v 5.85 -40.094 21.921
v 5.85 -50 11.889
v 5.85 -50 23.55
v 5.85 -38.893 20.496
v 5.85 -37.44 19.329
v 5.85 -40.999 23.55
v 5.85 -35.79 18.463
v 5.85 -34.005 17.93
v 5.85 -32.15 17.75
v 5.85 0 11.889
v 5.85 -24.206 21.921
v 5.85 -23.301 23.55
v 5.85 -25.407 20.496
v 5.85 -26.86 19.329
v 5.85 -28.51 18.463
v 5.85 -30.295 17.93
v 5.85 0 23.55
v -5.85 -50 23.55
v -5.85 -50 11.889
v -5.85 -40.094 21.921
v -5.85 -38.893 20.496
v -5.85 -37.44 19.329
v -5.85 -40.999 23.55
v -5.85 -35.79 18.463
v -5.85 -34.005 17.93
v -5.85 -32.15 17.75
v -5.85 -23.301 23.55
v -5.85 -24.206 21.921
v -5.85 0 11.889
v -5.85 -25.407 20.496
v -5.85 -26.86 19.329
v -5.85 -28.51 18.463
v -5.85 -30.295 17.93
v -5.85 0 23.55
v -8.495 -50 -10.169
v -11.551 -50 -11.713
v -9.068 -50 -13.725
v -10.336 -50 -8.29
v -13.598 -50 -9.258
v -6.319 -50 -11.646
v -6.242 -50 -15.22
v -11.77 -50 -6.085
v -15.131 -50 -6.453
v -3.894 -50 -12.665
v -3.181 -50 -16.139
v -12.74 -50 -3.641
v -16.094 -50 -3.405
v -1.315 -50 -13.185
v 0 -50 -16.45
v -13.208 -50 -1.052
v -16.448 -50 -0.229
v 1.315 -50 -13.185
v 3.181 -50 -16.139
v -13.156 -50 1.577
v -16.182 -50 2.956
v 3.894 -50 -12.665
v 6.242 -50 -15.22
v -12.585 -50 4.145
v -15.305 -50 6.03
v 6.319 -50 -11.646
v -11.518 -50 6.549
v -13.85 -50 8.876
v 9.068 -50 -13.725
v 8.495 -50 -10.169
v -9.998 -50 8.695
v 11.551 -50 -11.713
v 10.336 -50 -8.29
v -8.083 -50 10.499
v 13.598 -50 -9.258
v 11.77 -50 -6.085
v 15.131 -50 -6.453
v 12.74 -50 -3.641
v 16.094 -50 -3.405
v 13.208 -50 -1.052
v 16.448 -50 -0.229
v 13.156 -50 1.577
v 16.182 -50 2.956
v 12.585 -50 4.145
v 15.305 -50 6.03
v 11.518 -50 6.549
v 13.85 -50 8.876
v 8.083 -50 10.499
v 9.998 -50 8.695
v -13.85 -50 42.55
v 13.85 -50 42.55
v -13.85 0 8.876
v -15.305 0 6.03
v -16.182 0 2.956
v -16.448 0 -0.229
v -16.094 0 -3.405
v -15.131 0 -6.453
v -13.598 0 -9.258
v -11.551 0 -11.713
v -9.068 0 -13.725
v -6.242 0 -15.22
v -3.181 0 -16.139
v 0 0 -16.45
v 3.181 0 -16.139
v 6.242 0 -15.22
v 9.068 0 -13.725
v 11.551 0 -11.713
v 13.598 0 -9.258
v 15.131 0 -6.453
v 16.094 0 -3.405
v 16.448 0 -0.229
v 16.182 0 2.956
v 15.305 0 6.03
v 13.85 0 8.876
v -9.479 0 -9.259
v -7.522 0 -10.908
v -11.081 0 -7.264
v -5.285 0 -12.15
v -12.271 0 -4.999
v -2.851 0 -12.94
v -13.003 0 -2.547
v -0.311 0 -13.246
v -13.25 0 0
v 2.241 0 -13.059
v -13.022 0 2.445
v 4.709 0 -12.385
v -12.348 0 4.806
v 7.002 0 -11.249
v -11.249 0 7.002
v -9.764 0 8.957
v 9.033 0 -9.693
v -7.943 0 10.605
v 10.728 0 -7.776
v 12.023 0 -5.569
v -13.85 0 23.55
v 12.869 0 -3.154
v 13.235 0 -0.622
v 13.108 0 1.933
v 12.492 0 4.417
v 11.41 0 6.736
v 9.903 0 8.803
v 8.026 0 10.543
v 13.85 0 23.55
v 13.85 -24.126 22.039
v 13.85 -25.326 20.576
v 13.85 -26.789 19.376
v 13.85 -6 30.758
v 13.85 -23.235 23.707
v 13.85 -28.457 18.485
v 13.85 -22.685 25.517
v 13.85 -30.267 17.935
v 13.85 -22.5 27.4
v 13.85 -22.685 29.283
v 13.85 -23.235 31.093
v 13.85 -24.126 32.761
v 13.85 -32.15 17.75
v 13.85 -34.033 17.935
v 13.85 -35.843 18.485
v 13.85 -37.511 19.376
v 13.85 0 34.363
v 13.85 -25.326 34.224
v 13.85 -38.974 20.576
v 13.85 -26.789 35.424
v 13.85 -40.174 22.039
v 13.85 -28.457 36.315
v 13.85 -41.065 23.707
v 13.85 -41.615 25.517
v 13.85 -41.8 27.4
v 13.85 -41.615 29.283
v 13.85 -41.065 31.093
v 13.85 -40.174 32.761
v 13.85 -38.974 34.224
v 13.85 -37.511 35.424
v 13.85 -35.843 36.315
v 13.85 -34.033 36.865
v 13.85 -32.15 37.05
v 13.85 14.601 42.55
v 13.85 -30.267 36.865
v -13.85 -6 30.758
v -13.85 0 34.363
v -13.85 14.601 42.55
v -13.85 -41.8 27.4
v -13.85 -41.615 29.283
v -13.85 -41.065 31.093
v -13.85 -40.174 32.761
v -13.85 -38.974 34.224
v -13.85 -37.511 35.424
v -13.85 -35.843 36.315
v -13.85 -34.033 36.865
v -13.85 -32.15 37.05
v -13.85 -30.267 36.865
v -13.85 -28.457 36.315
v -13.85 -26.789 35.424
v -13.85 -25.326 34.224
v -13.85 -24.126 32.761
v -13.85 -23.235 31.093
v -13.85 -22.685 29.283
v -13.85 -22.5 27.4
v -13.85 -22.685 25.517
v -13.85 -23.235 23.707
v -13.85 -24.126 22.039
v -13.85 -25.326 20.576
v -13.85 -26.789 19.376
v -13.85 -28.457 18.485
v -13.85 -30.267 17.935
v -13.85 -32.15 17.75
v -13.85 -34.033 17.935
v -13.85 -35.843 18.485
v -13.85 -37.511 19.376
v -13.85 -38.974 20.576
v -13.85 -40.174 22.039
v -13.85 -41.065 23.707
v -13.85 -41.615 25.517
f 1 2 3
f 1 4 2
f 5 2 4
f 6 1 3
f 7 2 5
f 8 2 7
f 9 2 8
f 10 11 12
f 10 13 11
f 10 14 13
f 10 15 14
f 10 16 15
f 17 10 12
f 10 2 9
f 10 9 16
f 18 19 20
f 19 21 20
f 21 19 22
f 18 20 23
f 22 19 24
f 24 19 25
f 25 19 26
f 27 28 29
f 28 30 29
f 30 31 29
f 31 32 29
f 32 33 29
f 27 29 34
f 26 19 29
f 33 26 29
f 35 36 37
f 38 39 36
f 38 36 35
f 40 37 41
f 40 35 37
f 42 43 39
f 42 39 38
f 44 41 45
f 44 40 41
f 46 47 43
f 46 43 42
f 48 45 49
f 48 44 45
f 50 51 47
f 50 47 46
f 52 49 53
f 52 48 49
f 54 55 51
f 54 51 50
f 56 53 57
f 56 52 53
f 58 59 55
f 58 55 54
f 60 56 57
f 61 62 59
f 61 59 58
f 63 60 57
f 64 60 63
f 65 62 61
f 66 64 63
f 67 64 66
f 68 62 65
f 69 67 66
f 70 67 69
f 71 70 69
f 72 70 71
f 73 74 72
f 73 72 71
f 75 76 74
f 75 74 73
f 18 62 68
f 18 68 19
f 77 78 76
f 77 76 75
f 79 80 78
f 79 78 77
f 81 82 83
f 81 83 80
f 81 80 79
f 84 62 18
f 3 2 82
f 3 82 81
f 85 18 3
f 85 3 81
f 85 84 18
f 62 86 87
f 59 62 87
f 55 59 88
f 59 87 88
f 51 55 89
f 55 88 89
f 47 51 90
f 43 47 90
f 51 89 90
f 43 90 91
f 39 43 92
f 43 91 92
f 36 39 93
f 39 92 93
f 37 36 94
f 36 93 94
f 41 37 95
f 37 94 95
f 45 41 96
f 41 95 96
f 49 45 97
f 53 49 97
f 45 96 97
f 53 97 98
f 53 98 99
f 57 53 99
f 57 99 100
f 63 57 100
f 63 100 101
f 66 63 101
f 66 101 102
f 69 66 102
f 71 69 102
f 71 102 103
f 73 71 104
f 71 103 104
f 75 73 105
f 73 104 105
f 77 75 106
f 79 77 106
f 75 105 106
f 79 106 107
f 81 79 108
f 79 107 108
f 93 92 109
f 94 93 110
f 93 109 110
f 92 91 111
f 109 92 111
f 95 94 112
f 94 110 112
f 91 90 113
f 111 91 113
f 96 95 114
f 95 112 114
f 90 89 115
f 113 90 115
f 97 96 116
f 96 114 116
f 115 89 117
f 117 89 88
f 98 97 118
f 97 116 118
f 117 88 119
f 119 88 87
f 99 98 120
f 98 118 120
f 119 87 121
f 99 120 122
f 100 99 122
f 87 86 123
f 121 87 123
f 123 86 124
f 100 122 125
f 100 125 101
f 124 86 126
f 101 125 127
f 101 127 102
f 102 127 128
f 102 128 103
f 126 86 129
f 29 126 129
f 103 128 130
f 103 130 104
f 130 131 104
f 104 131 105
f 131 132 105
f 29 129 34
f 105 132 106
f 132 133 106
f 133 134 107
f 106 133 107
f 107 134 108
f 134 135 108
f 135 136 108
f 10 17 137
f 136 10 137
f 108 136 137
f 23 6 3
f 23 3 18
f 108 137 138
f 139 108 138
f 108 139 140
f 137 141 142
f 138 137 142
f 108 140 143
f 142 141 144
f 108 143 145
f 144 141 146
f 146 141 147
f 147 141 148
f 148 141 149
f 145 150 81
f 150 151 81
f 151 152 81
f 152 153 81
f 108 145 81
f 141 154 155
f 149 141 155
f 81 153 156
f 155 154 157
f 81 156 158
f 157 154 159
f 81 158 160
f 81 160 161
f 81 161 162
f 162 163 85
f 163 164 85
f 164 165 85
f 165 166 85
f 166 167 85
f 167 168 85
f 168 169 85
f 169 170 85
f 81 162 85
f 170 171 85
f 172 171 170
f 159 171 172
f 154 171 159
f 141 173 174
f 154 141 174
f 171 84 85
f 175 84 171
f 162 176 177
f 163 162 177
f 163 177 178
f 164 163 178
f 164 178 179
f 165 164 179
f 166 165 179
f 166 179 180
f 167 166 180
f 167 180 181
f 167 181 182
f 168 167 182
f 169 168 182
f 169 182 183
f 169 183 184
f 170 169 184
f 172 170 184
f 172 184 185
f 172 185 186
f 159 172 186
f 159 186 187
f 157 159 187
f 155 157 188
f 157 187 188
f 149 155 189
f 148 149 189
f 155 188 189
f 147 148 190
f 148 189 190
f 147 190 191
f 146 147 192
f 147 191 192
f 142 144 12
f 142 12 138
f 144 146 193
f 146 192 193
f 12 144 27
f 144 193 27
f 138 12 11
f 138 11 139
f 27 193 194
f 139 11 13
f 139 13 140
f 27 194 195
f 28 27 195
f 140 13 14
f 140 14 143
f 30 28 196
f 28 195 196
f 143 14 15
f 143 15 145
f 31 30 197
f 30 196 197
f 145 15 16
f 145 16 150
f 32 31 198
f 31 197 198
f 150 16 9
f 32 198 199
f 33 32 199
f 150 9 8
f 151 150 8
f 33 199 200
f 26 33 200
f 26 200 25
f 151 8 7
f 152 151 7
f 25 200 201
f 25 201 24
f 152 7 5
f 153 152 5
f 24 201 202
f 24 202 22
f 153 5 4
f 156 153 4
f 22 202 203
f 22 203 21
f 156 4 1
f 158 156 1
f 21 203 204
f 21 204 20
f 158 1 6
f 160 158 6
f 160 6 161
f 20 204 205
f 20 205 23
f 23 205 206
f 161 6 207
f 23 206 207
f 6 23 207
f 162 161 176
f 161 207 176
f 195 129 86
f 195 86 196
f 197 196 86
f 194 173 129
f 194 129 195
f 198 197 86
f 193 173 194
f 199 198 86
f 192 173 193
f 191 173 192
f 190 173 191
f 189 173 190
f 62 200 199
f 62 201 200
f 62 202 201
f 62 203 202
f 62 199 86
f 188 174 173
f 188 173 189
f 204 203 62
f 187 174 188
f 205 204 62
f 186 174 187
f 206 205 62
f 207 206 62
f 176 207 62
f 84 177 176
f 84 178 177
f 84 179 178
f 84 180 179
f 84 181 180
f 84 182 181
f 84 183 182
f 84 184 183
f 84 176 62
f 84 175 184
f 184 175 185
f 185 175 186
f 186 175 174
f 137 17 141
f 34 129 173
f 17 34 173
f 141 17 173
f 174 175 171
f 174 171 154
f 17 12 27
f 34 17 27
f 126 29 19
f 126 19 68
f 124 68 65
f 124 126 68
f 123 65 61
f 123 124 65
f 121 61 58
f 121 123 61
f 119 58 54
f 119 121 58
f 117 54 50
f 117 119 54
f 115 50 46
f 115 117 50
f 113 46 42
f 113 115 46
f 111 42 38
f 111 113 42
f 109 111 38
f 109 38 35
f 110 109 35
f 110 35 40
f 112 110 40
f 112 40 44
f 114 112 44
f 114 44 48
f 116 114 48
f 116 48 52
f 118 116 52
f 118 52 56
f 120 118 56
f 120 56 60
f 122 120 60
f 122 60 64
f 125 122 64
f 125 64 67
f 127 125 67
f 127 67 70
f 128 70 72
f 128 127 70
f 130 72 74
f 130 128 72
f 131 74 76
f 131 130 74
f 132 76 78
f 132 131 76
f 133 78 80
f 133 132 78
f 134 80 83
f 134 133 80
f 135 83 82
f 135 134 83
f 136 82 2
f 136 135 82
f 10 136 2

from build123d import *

# Parameters (mm, degrees)
F0_R     = 13.25
F1_DEPTH = 50
F2_R     = 9.65
F3_DEPTH = 30.301
F5_DEPTH = 30.301
F7_DEPTH = 27.7
F8_W     = 11.7
F8_H     = 11.66135
F9_DEPTH = 50.001


with BuildPart() as f1:
    # F0 (on Front) → F1 (new body)
    with BuildSketch(Plane.XZ):
        with BuildLine():
            Line((-13.85, 42.55), (-13.85, 8.87581))
            ThreePointArc((-13.85, 8.87581), (0, -16.45), (13.85, 8.87581))
            Line((13.85, 8.87581), (13.85, 42.55))
            Line((13.85, 42.55), (-13.85, 42.55))
        make_face()
        Circle(F0_R, mode=Mode.SUBTRACT)
    extrude(amount=F1_DEPTH)

    # F2 (on face) → F3 (cut, through all)
    with BuildSketch(Plane(origin=(-13.85, 0, 0), x_dir=(0, -1, 0), z_dir=(-1, 0, 0))):
        with Locations((32.15, 27.4)):
            Circle(F2_R)
    extrude(amount=-F3_DEPTH, mode=Mode.SUBTRACT)

    # F4 (on face) → F5 (cut, through all)
    with BuildSketch(Plane(origin=(-13.85, 0, 0), x_dir=(0, -1, 0), z_dir=(-1, 0, 0))):
        Polygon((0, 23.55), (6, 30.757681), (0, 34.363233), align=None)
    extrude(amount=-F5_DEPTH, mode=Mode.SUBTRACT)

    # F6 (on face) → F7 (join)
    with BuildSketch(Plane(origin=(-13.85, 0, 0), x_dir=(0, -1, 0), z_dir=(-1, 0, 0))):
        Polygon((-14.600857, 42.55), (0, 34.363233), (0, 42.55), align=None)
    extrude(amount=-F7_DEPTH)

    # F8 (on face) → F9 (cut, through all)
    with BuildSketch(Plane(origin=(0, 0, 0), x_dir=(-1, 0, 0), z_dir=(0, 1, 0))):
        with Locations((0, 17.719325)):
            Rectangle(F8_W, F8_H)
        with BuildLine():
            ThreePointArc((13.25, 0), (11.248889, 7.001785), (5.85, 11.88865))
            Line((5.85, 11.88865), (-5.85, 11.88865))
            ThreePointArc((-5.85, 11.88865), (-7.001785, -11.248889), (13.25, 0))
        make_face()
    extrude(amount=-F9_DEPTH, mode=Mode.SUBTRACT)


solid = f1.part
